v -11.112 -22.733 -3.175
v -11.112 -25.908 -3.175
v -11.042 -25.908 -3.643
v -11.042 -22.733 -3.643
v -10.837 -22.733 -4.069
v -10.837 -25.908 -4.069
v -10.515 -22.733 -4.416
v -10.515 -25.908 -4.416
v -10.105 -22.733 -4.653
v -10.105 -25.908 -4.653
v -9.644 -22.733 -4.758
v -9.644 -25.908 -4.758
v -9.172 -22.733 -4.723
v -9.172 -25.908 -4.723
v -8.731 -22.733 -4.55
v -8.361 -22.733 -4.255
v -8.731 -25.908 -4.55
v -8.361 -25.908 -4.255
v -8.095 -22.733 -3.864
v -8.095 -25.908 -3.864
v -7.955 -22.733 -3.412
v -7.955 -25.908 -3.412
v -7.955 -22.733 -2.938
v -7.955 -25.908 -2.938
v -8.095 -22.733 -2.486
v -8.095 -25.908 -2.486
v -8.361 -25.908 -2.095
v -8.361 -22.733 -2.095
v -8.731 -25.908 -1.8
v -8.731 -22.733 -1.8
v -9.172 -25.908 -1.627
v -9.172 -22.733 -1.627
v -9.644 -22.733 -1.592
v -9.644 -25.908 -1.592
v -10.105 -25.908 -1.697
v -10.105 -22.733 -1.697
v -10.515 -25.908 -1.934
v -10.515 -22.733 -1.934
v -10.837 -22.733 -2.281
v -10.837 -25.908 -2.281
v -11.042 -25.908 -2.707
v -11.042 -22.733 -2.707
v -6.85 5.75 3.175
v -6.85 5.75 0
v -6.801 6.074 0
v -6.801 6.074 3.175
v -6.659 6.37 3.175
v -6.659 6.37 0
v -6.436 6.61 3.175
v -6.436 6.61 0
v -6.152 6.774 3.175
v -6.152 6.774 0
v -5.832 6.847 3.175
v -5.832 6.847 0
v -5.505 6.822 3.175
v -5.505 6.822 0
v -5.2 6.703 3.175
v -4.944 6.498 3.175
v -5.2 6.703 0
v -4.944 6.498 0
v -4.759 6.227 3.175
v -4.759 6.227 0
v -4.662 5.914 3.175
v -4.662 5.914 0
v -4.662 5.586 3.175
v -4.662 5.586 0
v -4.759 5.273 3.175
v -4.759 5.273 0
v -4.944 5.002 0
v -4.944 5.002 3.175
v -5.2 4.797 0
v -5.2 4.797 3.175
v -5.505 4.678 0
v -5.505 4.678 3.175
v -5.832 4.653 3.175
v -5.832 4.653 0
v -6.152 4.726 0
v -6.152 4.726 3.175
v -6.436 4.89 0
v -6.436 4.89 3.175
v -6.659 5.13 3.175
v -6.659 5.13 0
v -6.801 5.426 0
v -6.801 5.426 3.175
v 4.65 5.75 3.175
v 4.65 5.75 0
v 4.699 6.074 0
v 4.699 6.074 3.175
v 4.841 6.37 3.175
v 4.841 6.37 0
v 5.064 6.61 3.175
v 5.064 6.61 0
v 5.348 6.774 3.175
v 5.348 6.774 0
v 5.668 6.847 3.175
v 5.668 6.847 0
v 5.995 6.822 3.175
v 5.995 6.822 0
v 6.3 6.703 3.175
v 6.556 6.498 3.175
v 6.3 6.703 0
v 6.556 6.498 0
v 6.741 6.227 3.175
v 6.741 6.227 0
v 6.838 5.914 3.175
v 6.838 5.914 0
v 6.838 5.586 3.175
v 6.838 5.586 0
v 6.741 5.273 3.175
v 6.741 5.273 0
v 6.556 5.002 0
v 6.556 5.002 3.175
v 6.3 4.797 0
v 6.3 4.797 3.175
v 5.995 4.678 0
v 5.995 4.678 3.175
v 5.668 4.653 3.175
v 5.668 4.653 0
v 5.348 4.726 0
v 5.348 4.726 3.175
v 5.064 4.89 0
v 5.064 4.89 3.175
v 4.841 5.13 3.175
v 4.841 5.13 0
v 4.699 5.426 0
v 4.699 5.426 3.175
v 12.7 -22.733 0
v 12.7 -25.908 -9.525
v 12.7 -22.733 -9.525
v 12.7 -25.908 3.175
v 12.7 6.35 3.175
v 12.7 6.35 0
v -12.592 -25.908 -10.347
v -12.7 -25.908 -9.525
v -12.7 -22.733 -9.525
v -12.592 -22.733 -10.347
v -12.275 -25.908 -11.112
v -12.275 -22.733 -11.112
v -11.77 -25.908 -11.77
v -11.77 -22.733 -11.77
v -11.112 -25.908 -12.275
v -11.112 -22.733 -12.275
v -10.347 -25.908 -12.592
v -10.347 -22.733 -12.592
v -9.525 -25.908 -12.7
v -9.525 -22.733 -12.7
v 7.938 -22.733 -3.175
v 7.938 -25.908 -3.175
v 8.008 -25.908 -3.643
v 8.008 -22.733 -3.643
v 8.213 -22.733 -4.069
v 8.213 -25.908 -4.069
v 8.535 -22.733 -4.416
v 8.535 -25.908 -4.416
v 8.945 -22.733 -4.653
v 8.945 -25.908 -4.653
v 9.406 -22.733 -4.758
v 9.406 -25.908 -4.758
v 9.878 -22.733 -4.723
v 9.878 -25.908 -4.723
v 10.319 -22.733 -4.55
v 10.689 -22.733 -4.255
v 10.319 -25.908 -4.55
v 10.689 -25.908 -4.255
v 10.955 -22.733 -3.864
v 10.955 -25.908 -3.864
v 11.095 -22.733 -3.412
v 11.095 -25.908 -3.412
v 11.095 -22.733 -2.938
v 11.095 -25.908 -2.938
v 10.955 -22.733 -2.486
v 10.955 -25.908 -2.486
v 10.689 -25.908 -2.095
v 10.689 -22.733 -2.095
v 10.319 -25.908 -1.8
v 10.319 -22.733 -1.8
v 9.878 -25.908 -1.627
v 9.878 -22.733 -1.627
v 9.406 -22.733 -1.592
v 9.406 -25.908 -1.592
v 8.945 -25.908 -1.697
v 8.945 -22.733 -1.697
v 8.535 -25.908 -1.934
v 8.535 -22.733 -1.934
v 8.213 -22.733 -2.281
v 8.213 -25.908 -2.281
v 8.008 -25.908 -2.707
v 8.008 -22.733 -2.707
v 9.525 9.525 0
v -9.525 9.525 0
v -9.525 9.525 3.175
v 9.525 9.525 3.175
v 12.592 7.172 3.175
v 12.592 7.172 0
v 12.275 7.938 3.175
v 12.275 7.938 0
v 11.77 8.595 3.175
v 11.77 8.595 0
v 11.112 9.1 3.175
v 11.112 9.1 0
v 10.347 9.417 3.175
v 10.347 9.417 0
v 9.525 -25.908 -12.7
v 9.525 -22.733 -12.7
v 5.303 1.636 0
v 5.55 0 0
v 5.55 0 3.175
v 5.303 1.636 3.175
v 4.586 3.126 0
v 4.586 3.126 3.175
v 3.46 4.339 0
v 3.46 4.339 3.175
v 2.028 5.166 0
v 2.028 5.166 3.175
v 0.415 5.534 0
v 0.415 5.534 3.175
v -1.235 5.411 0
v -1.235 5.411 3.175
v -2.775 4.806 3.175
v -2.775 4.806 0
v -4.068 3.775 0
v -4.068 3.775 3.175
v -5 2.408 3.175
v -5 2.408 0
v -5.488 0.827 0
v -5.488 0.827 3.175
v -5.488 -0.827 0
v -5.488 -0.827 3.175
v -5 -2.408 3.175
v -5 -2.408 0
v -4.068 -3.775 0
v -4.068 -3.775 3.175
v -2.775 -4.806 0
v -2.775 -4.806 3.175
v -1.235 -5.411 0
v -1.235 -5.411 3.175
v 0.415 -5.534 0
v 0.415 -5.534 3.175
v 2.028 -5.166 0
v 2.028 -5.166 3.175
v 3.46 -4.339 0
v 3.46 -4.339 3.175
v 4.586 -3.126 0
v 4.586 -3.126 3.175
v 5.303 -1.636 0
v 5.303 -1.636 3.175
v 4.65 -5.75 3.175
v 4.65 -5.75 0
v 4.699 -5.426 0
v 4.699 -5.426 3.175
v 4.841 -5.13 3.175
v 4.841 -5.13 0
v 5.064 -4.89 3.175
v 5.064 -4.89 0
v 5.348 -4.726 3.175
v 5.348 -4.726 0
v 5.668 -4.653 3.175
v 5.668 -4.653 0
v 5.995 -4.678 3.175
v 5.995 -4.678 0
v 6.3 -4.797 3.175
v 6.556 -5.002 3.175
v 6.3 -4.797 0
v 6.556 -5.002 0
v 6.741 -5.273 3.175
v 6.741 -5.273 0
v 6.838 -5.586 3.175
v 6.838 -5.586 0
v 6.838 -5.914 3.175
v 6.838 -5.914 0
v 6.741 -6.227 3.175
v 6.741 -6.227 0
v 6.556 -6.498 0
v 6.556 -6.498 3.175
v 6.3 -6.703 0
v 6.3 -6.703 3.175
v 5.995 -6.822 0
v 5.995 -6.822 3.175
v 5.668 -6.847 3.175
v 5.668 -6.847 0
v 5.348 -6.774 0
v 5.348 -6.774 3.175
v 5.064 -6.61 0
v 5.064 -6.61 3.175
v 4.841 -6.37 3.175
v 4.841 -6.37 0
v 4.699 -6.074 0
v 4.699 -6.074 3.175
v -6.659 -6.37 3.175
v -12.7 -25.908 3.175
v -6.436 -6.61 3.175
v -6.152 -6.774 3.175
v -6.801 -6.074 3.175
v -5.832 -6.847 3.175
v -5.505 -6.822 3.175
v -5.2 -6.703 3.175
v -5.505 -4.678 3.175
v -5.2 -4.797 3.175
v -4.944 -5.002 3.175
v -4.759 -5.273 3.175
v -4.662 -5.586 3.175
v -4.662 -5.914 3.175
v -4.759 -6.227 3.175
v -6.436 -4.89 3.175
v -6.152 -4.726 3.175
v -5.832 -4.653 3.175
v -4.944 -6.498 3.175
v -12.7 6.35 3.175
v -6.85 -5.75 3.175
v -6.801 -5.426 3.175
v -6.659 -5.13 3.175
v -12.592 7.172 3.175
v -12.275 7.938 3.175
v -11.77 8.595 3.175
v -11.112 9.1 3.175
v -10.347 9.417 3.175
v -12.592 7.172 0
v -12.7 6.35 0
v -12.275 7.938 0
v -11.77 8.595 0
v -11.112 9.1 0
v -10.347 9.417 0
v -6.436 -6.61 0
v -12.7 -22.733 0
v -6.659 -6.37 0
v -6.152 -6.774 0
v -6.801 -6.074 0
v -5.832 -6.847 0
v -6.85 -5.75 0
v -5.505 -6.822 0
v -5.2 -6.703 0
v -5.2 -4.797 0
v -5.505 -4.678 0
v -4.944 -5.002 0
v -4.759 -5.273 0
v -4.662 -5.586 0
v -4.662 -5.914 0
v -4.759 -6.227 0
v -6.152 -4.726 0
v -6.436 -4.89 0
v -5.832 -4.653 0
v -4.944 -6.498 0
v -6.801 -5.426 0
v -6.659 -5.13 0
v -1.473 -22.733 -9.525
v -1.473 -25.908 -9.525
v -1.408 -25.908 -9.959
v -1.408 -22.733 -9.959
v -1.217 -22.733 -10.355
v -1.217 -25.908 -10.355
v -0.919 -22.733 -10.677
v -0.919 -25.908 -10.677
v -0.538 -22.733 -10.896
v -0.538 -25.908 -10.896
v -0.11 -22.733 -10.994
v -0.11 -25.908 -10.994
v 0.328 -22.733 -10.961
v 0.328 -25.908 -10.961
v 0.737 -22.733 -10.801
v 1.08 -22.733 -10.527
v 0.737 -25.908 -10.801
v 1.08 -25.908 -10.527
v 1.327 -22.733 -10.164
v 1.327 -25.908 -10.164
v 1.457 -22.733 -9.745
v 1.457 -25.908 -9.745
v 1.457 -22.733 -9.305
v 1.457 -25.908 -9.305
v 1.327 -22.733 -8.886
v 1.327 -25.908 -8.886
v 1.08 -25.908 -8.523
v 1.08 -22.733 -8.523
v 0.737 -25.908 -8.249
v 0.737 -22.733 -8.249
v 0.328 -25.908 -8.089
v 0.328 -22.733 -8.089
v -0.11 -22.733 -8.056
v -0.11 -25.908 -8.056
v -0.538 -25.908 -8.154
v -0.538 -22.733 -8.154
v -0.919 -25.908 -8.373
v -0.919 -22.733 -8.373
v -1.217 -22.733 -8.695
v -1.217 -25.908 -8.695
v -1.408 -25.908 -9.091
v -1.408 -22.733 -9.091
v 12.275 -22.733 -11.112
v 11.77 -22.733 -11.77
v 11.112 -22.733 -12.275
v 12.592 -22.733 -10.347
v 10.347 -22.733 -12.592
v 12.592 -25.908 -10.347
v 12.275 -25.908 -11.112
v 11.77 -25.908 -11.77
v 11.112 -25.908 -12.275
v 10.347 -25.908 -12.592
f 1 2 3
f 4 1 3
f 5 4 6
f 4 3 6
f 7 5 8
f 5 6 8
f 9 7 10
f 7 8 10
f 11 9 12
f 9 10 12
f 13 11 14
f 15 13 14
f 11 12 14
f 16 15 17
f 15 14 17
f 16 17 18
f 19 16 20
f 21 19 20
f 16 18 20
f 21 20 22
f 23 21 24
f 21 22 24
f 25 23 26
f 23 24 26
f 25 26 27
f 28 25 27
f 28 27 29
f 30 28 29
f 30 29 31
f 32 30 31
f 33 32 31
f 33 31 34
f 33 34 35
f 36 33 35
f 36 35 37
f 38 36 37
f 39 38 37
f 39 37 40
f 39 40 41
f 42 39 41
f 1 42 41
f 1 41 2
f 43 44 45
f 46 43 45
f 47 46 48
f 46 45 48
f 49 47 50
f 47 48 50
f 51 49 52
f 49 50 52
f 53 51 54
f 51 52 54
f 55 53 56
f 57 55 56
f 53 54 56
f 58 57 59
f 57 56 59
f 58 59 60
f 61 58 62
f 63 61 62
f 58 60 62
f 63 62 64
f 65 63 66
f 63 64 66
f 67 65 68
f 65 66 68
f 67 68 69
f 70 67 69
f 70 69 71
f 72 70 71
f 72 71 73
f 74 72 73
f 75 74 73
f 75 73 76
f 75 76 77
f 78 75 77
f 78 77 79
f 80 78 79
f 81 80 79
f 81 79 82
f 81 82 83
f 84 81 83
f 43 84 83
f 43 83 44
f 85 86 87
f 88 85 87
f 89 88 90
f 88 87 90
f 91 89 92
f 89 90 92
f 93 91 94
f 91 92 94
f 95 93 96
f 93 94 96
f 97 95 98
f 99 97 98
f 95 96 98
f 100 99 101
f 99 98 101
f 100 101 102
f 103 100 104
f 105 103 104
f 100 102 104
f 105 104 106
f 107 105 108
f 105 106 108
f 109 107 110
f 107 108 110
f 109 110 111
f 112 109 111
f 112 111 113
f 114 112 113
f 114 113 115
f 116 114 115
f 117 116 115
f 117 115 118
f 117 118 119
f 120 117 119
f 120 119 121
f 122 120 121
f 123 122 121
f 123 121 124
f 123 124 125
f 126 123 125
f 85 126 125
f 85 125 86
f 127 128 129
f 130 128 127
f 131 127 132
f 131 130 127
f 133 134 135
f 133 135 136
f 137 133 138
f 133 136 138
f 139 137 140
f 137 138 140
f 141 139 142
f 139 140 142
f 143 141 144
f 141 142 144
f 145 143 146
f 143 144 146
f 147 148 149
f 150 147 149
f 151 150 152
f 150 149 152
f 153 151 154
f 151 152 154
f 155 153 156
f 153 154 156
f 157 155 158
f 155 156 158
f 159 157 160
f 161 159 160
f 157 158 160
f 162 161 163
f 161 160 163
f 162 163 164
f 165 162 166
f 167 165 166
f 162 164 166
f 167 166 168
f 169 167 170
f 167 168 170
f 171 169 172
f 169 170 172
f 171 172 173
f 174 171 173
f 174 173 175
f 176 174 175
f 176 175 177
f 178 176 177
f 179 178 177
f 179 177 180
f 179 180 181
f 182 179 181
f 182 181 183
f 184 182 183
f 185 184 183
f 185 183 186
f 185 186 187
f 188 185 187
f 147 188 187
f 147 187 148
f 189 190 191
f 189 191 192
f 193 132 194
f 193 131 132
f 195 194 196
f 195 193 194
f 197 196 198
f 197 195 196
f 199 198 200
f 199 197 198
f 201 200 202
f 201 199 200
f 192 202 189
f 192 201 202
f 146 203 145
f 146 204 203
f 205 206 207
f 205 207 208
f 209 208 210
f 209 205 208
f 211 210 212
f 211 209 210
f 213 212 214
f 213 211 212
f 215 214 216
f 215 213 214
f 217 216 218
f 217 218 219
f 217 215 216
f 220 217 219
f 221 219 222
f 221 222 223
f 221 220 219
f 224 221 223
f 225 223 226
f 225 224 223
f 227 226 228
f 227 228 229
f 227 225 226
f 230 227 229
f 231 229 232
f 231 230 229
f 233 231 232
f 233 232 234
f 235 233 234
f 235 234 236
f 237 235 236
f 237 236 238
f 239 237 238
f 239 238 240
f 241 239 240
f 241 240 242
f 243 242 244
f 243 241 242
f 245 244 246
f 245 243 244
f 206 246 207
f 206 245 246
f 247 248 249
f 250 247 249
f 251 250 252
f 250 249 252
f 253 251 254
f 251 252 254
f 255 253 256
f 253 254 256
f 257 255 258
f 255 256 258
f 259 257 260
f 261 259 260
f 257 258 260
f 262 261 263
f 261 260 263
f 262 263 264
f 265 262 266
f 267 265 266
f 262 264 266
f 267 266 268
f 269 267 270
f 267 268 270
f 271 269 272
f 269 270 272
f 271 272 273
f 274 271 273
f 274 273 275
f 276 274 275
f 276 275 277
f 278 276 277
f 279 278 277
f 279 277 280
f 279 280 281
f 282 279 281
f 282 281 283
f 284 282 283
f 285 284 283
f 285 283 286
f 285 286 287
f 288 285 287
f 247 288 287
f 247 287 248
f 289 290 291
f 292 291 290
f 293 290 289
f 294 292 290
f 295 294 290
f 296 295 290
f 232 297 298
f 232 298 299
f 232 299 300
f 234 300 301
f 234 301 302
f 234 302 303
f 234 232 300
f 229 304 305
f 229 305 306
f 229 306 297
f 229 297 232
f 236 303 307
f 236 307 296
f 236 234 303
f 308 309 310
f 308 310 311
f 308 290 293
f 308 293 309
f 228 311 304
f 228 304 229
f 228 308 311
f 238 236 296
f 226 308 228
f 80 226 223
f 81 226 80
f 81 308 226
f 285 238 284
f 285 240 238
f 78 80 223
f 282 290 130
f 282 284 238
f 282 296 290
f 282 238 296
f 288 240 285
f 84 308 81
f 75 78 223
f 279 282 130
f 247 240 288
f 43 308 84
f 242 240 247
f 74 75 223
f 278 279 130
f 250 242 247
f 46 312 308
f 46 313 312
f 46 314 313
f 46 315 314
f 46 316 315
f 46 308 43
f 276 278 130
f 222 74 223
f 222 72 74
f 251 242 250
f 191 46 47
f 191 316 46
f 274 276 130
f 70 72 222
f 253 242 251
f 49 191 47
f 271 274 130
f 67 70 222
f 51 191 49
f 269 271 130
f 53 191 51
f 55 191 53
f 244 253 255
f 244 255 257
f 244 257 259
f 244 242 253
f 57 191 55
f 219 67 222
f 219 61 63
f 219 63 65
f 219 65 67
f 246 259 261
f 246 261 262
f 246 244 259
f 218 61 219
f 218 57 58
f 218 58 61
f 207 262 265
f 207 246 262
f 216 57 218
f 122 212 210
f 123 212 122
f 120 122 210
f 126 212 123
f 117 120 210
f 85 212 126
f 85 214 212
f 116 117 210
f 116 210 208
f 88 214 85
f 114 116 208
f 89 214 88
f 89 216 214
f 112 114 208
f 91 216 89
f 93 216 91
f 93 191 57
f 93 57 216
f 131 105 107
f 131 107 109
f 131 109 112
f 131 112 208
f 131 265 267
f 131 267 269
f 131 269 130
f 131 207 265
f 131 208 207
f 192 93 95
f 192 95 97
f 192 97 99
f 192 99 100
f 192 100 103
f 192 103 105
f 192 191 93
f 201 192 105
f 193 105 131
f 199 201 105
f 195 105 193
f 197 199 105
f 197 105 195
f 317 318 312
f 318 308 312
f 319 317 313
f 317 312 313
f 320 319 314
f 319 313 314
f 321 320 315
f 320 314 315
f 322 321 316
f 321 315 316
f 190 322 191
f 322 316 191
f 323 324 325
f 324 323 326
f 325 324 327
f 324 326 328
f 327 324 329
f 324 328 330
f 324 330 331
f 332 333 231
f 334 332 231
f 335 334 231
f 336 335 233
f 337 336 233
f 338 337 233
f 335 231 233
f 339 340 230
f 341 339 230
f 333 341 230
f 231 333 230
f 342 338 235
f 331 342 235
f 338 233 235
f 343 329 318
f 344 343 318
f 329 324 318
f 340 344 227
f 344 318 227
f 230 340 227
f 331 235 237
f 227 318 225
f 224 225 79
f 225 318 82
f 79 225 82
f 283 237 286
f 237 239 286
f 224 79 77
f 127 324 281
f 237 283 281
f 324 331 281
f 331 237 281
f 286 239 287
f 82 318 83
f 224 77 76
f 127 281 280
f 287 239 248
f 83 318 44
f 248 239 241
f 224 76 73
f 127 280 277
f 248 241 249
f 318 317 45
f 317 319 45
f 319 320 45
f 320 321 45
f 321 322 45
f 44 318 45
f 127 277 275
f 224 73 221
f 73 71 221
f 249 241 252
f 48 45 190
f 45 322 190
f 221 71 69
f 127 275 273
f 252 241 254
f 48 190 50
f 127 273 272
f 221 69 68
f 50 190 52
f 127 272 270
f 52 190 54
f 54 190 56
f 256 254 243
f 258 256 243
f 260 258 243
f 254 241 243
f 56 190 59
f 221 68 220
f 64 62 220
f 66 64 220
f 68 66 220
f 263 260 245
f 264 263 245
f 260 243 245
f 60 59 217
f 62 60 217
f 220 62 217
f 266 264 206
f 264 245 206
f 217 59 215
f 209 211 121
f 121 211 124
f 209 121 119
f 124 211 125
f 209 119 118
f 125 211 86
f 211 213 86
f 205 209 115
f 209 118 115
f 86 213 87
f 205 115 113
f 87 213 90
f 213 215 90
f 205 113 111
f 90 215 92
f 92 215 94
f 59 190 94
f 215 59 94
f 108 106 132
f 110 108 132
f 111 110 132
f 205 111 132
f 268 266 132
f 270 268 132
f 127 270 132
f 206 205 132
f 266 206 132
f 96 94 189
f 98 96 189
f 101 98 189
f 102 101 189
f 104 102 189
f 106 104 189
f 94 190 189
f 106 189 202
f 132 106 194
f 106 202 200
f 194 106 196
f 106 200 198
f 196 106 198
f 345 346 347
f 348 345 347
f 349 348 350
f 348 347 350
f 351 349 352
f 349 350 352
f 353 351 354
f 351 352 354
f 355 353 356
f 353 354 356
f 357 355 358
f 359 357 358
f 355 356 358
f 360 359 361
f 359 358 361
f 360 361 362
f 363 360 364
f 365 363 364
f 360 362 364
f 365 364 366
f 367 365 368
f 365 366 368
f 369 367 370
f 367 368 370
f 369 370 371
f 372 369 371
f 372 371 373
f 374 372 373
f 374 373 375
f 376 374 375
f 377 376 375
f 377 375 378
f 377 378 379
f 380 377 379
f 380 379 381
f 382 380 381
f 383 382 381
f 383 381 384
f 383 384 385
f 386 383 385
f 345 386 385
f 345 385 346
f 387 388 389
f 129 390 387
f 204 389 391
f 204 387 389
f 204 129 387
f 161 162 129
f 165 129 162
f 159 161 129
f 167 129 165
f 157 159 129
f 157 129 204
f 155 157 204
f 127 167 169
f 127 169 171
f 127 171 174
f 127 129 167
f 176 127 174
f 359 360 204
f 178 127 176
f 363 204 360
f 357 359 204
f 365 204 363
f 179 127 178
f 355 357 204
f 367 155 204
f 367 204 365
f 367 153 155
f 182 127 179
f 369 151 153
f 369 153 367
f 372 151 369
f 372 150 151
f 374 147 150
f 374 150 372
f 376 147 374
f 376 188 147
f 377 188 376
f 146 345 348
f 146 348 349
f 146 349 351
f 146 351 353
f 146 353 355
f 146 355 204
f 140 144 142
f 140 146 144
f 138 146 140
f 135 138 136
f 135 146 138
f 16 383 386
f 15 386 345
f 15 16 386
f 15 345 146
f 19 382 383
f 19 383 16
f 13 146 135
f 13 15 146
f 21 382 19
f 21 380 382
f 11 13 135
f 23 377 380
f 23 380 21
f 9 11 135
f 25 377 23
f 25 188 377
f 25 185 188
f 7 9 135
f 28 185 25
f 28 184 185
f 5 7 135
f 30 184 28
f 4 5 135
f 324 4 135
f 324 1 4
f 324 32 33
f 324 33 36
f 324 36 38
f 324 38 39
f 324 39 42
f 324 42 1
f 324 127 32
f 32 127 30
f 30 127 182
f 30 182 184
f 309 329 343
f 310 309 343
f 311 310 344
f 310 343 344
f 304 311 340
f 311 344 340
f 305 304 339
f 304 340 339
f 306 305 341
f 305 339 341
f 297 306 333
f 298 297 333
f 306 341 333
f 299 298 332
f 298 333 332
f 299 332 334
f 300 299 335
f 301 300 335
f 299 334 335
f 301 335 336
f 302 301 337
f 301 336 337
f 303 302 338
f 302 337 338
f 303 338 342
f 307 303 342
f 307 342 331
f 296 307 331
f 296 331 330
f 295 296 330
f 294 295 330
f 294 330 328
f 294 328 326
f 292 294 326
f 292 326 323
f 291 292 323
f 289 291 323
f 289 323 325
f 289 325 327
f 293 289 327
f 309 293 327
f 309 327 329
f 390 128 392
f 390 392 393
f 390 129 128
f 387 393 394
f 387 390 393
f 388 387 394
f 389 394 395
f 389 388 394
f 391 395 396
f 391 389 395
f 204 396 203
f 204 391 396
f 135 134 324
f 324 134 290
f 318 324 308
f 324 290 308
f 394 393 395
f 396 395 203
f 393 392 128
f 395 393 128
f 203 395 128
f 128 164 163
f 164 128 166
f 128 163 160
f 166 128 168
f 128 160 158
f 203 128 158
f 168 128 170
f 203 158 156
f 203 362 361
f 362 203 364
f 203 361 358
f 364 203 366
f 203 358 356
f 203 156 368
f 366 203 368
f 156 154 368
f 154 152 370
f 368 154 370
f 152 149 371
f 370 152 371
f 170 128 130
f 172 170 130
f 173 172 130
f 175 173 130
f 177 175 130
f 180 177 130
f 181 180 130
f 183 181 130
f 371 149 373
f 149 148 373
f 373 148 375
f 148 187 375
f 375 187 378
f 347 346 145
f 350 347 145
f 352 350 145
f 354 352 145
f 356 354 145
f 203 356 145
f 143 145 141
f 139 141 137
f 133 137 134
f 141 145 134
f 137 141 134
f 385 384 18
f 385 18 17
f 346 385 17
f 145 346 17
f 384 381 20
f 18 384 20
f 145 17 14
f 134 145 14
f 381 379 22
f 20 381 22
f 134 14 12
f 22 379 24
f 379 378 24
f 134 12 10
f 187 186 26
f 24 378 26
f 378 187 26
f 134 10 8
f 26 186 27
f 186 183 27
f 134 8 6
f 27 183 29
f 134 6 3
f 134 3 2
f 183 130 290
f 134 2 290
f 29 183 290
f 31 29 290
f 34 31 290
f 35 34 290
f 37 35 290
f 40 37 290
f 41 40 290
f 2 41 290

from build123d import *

# Parameters (mm, degrees)
SKETCH1_W                      = 25.4
SKETCH1_H                      = 35.433
SKETCH1_R                      = 5.55
BOSS_EXTRUDE1_DEPTH            = 3.175
SKETCH3_W                      = 25.4
SKETCH3_H                      = 3.175
BOSS_EXTRUDE2_DEPTH            = 12.7
FILLET1_R                      = 3.175
M2_CLEARANCE_HOLE1_D           = 2.2
F_4_CLEARANCE_HOLE1_D          = 2.9464
F_1_8_0_1250_DOWEL_HOLE1_D     = 3.175
F_1_8_0_1250_DOWEL_HOLE1_DEPTH = 4.064
F_1_8_0_1250_DOWEL_HOLE1_TIP   = 0.953866233


with BuildPart() as part:
    # Sketch1 → Boss-Extrude1 (new body)
    with BuildSketch(Plane.XY):
        with Locations((0, -8.1915)):
            Rectangle(SKETCH1_W, SKETCH1_H)
        Circle(SKETCH1_R, mode=Mode.SUBTRACT)
    extrude(amount=BOSS_EXTRUDE1_DEPTH)

    # Sketch3 → Boss-Extrude2 (add)
    with BuildSketch(Plane(origin=(0, 0, 0), x_dir=(-1, 0, 0), z_dir=(0, 0, -1))):
        with Locations((0, -24.3205)):
            Rectangle(SKETCH3_W, SKETCH3_H)
    extrude(amount=BOSS_EXTRUDE2_DEPTH)

    # Fillet1
    fillet1_edges = [part.edges().sort_by_distance(p)[0] for p in [
        (-12.7, -24.3205, -12.7),
        (12.7, -24.3205, -12.7),
        (-12.7, 9.525, 1.5875),
        (12.7, 9.525, 1.5875),
    ]]
    fillet(fillet1_edges, radius=FILLET1_R)

    # M2 Clearance Hole1 (through all)
    with Locations(Plane(origin=(0, -25.908, 3.175), x_dir=(1, 0, 0), z_dir=(0, 0, 1))):
        with Locations((5.75, 31.658), (-5.75, 31.658), (5.75, 20.158), (-5.75, 20.158)):
            Hole(M2_CLEARANCE_HOLE1_D / 2)

    # #4 Clearance Hole1 (through all)
    with Locations(Plane(origin=(0, -22.733, 0), x_dir=(1, 0, 0), z_dir=(0, 1, 0))):
        with Locations((0, 9.525)):
            Hole(F_4_CLEARANCE_HOLE1_D / 2)

    # 1/8 (0.1250) Dowel Hole1
    with Locations(Plane(origin=(0, -22.733, 0), x_dir=(1, 0, 0), z_dir=(0, 1, 0))):
        with Locations((9.525, 3.175), (-9.525, 3.175)):
            Hole(F_1_8_0_1250_DOWEL_HOLE1_D / 2, depth=F_1_8_0_1250_DOWEL_HOLE1_DEPTH)
            with Locations((0, 0, -(F_1_8_0_1250_DOWEL_HOLE1_DEPTH + F_1_8_0_1250_DOWEL_HOLE1_TIP / 2))):  # 118° drill point
                Cone(0, F_1_8_0_1250_DOWEL_HOLE1_D / 2, F_1_8_0_1250_DOWEL_HOLE1_TIP, mode=Mode.SUBTRACT)


solid = part.part
